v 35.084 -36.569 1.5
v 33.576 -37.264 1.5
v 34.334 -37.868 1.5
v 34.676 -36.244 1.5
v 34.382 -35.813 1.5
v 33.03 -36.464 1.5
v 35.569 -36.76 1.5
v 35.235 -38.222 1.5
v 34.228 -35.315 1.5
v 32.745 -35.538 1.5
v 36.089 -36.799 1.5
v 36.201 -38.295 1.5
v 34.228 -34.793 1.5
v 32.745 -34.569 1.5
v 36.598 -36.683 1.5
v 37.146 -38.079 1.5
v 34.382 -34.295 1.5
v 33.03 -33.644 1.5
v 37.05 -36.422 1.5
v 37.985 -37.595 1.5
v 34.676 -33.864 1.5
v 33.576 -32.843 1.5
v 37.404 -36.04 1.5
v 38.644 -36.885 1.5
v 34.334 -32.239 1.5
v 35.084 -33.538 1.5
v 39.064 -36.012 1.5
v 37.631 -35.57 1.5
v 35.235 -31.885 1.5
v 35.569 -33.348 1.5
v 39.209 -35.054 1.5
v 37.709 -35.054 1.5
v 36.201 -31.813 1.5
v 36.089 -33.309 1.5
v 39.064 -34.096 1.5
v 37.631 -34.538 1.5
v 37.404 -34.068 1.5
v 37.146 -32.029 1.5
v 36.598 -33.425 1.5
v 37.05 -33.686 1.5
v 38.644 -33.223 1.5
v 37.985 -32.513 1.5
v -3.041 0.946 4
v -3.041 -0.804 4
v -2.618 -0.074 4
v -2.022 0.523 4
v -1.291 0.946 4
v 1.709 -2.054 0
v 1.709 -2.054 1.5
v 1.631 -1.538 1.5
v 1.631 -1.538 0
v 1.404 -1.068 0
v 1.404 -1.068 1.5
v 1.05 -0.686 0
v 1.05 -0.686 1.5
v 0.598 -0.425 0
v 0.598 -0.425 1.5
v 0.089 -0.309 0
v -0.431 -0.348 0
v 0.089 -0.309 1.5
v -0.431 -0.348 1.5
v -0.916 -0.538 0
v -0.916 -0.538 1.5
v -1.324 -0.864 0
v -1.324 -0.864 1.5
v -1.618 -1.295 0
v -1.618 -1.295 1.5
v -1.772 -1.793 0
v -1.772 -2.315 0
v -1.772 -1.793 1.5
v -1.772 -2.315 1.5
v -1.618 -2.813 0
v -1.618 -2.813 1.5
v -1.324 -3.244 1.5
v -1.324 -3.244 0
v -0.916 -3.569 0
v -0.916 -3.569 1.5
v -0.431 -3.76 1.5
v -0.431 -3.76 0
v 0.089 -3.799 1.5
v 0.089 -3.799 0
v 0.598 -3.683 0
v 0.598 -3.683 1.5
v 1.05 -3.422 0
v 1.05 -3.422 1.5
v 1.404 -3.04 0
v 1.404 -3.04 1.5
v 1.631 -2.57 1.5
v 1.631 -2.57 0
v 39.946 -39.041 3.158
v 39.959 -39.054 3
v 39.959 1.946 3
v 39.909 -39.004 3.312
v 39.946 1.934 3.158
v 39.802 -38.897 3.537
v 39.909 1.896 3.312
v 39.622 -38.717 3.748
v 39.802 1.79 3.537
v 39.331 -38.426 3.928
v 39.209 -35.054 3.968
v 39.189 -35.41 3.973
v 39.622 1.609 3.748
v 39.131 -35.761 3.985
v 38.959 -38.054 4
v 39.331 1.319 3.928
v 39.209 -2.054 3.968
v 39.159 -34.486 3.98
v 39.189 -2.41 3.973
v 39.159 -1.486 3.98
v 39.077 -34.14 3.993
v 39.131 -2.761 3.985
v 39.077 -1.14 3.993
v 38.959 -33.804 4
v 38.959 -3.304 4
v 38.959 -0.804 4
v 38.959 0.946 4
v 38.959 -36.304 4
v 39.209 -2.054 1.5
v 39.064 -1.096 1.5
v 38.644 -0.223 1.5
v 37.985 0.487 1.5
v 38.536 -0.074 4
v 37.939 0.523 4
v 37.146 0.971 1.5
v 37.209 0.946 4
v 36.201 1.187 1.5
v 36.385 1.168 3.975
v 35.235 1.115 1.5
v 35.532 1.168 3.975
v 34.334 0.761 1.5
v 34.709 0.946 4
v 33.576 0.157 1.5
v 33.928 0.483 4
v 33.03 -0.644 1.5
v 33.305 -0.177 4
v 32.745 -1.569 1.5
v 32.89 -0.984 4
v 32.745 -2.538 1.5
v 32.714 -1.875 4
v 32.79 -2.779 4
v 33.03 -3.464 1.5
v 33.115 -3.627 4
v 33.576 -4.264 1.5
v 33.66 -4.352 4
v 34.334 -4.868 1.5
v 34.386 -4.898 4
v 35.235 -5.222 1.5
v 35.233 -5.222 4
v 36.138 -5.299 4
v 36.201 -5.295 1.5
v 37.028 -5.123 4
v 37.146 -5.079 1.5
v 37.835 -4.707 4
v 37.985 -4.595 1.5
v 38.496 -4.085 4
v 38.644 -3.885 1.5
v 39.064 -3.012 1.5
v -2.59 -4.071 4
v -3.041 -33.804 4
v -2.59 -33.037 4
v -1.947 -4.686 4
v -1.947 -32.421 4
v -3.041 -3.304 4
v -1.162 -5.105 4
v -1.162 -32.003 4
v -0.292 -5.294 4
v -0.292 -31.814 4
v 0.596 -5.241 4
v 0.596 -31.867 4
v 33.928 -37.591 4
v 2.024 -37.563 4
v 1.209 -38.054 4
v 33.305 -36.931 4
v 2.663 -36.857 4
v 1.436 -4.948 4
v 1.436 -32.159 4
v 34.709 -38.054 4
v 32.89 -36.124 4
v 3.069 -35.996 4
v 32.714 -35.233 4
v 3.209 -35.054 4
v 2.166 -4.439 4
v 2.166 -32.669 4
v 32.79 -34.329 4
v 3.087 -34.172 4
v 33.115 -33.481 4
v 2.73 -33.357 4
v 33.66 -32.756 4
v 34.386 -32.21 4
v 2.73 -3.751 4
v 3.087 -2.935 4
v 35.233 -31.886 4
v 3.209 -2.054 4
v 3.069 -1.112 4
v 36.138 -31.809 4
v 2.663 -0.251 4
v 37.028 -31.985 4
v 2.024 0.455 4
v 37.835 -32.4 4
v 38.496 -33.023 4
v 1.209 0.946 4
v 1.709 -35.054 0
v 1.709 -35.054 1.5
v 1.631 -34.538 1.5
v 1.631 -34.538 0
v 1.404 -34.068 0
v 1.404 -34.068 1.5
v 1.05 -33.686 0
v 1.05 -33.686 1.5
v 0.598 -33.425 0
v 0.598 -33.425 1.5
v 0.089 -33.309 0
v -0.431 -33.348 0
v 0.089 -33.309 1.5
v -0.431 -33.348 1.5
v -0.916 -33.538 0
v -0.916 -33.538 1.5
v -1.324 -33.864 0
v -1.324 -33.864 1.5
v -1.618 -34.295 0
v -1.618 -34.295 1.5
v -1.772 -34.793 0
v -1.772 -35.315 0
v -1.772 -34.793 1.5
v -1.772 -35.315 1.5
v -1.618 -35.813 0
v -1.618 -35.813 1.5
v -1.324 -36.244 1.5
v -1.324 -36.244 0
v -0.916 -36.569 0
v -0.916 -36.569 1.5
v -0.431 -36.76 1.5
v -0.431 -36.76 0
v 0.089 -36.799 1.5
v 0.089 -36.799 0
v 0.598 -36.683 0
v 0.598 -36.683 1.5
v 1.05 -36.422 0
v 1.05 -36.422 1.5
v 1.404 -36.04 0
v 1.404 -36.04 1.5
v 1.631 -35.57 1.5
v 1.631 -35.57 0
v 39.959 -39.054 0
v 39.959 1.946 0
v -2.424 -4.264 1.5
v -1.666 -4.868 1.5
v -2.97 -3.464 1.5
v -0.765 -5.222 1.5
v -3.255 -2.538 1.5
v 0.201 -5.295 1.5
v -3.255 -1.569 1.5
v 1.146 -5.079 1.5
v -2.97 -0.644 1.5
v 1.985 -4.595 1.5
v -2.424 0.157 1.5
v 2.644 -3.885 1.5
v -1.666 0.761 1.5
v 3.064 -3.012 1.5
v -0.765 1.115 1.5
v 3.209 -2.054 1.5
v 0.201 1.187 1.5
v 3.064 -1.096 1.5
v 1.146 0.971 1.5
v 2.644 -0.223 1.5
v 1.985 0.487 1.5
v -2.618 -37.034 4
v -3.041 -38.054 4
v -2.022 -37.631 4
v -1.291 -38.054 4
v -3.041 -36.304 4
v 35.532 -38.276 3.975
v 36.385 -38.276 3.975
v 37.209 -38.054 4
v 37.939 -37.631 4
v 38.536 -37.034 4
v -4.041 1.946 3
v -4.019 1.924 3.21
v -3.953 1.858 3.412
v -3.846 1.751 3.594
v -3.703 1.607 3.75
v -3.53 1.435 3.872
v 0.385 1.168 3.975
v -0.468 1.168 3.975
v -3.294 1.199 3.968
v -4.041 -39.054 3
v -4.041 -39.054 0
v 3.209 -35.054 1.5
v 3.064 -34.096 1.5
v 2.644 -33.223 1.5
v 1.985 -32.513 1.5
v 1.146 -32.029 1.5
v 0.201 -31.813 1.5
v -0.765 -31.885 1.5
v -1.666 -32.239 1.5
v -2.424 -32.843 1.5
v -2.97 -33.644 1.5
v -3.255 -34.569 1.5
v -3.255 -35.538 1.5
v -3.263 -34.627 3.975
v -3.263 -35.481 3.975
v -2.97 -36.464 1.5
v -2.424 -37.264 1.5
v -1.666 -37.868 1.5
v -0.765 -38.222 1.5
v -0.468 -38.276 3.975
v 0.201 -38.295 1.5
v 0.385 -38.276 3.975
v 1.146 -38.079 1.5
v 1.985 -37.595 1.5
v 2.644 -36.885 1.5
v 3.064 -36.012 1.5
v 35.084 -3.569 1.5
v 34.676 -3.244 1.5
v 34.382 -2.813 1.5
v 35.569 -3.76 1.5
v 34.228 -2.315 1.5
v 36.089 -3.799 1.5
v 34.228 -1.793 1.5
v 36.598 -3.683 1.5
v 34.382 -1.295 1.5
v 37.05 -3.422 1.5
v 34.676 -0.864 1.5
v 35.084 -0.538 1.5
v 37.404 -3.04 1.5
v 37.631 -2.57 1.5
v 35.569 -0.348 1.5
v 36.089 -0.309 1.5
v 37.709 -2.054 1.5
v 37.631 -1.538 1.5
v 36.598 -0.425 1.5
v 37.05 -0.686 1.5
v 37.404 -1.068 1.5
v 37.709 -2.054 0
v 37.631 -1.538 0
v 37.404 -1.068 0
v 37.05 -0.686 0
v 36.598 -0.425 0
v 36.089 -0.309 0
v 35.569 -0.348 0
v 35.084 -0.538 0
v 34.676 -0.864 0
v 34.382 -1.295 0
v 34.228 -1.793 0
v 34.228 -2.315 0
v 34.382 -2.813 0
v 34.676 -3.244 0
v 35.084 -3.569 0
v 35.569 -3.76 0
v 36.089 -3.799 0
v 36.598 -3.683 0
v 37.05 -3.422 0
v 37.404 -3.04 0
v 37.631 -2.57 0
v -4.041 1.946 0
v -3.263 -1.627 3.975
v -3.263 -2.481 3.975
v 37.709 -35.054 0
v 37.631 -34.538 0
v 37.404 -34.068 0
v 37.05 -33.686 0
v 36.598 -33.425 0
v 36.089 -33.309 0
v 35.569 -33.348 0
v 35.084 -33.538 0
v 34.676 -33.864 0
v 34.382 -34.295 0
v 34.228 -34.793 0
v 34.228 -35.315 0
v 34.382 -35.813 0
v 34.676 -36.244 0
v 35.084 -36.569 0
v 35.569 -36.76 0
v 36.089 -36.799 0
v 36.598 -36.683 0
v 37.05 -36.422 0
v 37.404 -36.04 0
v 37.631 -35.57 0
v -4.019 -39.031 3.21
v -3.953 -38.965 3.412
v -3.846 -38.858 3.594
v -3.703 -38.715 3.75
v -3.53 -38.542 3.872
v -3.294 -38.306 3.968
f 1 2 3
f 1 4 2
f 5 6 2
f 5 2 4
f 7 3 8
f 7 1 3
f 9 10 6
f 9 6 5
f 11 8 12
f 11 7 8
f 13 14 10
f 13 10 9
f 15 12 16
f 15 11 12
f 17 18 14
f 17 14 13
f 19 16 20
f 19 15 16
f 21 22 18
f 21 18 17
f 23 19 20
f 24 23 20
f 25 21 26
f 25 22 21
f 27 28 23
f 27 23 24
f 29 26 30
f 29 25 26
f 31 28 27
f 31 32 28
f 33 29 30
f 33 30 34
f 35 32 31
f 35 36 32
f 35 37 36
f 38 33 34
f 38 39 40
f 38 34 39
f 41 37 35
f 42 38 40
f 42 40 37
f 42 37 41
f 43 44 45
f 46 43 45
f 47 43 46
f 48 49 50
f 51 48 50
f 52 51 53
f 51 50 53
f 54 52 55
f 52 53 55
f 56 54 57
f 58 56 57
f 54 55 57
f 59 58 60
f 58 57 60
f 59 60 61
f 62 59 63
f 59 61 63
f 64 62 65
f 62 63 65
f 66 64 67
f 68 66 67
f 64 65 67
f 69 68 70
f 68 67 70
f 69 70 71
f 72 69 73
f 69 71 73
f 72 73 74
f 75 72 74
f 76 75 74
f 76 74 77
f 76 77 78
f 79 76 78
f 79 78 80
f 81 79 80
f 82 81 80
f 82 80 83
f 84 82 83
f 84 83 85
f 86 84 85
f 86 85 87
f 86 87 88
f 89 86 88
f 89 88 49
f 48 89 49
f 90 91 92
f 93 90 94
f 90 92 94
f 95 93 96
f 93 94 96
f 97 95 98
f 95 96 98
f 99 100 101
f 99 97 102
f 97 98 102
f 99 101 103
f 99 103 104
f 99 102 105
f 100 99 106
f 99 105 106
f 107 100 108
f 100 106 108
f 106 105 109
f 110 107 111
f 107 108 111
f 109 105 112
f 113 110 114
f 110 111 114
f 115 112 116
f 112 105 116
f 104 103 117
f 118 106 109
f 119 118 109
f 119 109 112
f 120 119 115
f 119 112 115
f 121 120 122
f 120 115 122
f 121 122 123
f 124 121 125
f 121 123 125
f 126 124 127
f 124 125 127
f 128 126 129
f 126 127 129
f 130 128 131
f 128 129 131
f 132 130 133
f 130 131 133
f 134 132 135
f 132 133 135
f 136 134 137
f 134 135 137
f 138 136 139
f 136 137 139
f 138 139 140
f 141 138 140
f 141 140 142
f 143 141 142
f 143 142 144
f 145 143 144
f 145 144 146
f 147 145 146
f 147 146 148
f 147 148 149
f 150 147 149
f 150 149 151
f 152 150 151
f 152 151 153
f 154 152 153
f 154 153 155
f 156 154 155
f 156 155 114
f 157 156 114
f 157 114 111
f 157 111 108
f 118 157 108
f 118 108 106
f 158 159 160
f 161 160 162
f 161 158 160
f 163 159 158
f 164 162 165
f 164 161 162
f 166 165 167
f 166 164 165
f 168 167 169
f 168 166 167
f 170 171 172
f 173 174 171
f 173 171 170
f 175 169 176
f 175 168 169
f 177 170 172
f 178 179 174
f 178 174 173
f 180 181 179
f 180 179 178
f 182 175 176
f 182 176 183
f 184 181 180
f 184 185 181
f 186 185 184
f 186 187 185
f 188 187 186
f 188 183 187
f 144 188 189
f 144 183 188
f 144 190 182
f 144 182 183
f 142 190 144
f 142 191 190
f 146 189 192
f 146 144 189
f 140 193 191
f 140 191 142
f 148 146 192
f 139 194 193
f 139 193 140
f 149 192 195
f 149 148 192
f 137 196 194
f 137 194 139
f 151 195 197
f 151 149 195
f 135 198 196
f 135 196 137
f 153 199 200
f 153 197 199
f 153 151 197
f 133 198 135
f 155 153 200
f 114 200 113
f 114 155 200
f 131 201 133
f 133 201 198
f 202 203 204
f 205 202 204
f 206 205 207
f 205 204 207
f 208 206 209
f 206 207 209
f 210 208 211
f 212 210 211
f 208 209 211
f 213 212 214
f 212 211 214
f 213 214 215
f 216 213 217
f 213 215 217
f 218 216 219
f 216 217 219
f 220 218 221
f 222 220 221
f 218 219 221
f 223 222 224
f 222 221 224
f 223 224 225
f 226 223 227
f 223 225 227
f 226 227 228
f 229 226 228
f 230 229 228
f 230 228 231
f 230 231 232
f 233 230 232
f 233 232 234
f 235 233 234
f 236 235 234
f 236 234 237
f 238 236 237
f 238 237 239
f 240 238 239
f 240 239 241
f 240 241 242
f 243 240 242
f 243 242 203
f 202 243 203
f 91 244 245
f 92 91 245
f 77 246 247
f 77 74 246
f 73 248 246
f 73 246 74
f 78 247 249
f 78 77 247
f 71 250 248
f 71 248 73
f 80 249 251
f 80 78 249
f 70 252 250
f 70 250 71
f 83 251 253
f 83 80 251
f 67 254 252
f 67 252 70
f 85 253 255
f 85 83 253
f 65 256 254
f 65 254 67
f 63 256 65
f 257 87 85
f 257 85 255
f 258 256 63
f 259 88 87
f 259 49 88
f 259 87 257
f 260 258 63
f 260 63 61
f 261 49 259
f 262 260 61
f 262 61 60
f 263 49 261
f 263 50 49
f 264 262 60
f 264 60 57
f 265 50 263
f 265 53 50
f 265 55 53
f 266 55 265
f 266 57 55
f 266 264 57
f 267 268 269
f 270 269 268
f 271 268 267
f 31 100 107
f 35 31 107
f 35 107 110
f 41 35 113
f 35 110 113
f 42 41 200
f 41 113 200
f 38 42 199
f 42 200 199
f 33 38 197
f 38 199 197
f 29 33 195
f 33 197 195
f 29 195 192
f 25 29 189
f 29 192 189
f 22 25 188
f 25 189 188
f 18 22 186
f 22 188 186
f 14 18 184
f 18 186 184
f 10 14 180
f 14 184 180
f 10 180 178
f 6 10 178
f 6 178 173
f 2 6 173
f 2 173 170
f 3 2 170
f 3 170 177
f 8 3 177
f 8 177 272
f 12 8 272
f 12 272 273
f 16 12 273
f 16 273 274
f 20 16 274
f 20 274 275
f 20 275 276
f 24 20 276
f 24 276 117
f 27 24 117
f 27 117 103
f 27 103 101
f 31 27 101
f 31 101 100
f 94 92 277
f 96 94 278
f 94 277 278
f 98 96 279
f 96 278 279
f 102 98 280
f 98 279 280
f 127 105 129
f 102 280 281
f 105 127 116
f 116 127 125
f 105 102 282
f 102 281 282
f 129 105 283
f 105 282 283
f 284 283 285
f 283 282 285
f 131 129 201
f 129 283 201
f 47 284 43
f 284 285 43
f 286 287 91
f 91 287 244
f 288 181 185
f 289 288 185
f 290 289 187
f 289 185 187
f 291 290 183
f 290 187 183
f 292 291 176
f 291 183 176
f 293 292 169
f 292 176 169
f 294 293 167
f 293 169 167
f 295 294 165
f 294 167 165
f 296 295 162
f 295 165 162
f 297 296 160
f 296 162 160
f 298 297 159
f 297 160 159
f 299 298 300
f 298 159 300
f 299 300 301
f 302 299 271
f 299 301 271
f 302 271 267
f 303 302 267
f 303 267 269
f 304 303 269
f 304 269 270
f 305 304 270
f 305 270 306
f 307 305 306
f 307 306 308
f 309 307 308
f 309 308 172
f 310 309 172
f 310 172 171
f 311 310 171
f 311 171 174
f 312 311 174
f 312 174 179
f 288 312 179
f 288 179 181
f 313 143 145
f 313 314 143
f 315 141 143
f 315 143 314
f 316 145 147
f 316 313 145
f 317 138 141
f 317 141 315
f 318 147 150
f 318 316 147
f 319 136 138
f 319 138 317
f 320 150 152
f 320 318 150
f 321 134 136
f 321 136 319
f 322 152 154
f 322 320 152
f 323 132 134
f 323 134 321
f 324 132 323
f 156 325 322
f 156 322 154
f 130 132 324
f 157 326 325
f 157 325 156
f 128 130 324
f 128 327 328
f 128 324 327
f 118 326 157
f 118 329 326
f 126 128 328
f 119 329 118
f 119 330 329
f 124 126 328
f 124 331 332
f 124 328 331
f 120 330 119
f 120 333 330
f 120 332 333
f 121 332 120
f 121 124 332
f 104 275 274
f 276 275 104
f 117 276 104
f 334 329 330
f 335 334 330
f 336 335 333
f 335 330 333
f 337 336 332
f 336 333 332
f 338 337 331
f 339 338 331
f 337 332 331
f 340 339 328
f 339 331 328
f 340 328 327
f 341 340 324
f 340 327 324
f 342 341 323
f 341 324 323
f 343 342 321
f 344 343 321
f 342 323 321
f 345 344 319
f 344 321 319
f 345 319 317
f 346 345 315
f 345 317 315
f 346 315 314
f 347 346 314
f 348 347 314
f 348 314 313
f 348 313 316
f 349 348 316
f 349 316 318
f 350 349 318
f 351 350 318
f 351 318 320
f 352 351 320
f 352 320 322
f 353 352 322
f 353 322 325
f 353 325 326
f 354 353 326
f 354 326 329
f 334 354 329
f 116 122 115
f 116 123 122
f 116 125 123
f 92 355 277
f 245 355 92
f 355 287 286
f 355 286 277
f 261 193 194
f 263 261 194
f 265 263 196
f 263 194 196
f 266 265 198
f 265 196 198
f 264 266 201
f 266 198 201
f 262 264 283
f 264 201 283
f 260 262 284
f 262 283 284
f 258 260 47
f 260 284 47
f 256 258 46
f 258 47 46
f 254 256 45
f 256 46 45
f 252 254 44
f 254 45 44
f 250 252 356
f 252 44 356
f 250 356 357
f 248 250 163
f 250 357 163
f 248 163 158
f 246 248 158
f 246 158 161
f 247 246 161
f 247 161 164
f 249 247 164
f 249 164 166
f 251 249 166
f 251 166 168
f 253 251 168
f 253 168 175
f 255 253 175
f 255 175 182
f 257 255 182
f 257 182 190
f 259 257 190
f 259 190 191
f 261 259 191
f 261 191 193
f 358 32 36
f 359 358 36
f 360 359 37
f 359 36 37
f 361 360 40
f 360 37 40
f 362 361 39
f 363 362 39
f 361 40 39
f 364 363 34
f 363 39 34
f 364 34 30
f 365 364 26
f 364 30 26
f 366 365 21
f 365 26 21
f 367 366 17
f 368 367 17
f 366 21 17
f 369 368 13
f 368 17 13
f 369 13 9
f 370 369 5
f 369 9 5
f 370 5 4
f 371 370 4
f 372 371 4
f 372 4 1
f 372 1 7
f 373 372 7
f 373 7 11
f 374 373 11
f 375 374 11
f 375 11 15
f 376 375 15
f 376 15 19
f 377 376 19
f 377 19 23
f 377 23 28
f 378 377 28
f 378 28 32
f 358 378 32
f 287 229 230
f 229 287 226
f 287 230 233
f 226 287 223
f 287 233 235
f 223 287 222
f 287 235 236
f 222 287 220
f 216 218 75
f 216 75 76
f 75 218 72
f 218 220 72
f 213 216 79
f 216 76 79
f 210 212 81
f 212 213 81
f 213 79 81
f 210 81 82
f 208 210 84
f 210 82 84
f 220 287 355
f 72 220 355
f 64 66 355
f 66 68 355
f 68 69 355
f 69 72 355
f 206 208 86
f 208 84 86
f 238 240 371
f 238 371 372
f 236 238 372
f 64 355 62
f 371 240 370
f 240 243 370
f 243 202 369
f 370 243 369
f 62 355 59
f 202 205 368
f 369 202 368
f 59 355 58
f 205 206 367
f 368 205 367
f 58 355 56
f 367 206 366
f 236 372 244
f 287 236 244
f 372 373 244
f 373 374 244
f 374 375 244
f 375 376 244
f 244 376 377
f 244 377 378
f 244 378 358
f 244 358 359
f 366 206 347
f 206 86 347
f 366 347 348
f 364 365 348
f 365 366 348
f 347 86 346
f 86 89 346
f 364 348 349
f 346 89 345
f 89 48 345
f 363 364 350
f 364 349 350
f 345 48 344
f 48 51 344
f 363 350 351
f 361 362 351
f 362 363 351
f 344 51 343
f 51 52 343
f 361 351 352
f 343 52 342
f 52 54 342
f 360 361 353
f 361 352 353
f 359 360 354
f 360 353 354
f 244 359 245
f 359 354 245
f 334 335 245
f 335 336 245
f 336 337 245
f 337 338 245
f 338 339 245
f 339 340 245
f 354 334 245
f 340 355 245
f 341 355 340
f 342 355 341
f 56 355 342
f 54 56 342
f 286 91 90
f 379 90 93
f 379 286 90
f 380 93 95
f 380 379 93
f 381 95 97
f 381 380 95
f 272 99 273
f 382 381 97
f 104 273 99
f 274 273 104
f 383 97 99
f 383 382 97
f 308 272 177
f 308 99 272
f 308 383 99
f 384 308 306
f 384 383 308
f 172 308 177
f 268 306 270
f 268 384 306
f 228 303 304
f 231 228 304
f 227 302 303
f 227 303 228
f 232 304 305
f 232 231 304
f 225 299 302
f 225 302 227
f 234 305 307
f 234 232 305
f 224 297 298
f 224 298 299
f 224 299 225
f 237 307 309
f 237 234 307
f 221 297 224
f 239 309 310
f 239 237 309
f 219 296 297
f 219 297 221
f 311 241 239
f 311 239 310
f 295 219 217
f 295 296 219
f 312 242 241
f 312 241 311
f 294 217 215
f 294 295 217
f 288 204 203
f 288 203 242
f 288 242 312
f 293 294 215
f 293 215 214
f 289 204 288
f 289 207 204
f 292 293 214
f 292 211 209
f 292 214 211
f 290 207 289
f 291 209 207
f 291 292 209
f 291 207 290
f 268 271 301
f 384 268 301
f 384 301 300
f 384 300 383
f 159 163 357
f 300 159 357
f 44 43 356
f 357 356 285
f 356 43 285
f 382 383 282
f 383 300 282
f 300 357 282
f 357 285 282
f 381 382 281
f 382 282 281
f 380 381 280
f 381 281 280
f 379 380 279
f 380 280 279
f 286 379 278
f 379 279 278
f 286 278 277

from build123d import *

# Parameters (mm, degrees)
F0_W        = 44
F0_H        = 41
F1_DEPTH    = 4
F2_R        = 1.75
F3_DEPTH    = 4.001
F4_R        = 3.25
F5_DEPTH    = 2.5
F6_T1_DEPTH = 46
F6_T3_DEPTH = 49


# Not quite as in the source:
# - a fillet or chamfer that OpenCascade refuses, or shapes differently, is made with other operations: its cross-section is extruded or revolved along the edge and cut away or added


with BuildPart() as f1:
    # F0 (on Top) → F1 (new body)
    with BuildSketch(Plane.XY):
        with Locations((17.9585738778, -18.5538536012)):
            Rectangle(F0_W, F0_H)
    extrude(amount=F1_DEPTH)

    # F2 (on face) → F3 (cut, through all)
    with BuildSketch(Plane.XY.offset(4)):
        with Locations((-0.0414261222, -2.0538536012)):
            Circle(F2_R)
        with Locations((35.9585738778, -2.0538536012)):
            Circle(F2_R)
        with Locations((35.9585738778, -35.0538536012)):
            Circle(F2_R)
        with Locations((-0.0414261222, -35.0538536012)):
            Circle(F2_R)
    extrude(amount=-F3_DEPTH, mode=Mode.SUBTRACT)

    # F4 (on face) → F5 (cut)
    with BuildSketch(Plane.XY.offset(4)):
        with Locations((-0.0414261222, -2.0538536012)):
            Circle(F4_R)
        with Locations((35.9585738778, -2.0538536012)):
            Circle(F4_R)
        with Locations((35.9585738778, -35.0538536012)):
            Circle(F4_R)
        with Locations((-0.0414261222, -35.0538536012)):
            Circle(F4_R)
    extrude(amount=-F5_DEPTH, mode=Mode.SUBTRACT)

    # F6: fillet of radius 1 on 4 edges, made by hand

    # F6_s2 → F6_t1 (cut)
    with BuildSketch(Plane.XZ.offset(-4.4461463988)):
        with BuildLine():
            ThreePointArc((-3.0414261222, 4), (-3.7485329034, 3.7071067812), (-4.0414261222, 3))
            Line((-4.0414261222, 3), (-4.0414261222, 4))
            Line((-4.0414261222, 4), (-3.0414261222, 4))
        make_face()
        with BuildLine():
            ThreePointArc((39.9585738778, 3), (39.665680659, 3.7071067812), (38.9585738778, 4))
            Line((38.9585738778, 4), (39.9585738778, 4))
            Line((39.9585738778, 4), (39.9585738778, 3))
        make_face()
    extrude(amount=F6_T1_DEPTH, mode=Mode.SUBTRACT)

    # F6_s4 → F6_t3 (cut)
    with BuildSketch(Plane.YZ.offset(-6.5414261222)):
        with BuildLine():
            ThreePointArc((-39.0538536012, 3), (-38.7609603824, 3.7071067812), (-38.0538536012, 4))
            Line((-38.0538536012, 4), (-39.0538536012, 4))
            Line((-39.0538536012, 4), (-39.0538536012, 3))
        make_face()
        with BuildLine():
            ThreePointArc((1.9461463988, 3), (1.65325318, 3.7071067812), (0.9461463988, 4))
            Line((0.9461463988, 4), (1.9461463988, 4))
            Line((1.9461463988, 4), (1.9461463988, 3))
        make_face()
    extrude(amount=F6_T3_DEPTH, mode=Mode.SUBTRACT)


solid = f1.part
